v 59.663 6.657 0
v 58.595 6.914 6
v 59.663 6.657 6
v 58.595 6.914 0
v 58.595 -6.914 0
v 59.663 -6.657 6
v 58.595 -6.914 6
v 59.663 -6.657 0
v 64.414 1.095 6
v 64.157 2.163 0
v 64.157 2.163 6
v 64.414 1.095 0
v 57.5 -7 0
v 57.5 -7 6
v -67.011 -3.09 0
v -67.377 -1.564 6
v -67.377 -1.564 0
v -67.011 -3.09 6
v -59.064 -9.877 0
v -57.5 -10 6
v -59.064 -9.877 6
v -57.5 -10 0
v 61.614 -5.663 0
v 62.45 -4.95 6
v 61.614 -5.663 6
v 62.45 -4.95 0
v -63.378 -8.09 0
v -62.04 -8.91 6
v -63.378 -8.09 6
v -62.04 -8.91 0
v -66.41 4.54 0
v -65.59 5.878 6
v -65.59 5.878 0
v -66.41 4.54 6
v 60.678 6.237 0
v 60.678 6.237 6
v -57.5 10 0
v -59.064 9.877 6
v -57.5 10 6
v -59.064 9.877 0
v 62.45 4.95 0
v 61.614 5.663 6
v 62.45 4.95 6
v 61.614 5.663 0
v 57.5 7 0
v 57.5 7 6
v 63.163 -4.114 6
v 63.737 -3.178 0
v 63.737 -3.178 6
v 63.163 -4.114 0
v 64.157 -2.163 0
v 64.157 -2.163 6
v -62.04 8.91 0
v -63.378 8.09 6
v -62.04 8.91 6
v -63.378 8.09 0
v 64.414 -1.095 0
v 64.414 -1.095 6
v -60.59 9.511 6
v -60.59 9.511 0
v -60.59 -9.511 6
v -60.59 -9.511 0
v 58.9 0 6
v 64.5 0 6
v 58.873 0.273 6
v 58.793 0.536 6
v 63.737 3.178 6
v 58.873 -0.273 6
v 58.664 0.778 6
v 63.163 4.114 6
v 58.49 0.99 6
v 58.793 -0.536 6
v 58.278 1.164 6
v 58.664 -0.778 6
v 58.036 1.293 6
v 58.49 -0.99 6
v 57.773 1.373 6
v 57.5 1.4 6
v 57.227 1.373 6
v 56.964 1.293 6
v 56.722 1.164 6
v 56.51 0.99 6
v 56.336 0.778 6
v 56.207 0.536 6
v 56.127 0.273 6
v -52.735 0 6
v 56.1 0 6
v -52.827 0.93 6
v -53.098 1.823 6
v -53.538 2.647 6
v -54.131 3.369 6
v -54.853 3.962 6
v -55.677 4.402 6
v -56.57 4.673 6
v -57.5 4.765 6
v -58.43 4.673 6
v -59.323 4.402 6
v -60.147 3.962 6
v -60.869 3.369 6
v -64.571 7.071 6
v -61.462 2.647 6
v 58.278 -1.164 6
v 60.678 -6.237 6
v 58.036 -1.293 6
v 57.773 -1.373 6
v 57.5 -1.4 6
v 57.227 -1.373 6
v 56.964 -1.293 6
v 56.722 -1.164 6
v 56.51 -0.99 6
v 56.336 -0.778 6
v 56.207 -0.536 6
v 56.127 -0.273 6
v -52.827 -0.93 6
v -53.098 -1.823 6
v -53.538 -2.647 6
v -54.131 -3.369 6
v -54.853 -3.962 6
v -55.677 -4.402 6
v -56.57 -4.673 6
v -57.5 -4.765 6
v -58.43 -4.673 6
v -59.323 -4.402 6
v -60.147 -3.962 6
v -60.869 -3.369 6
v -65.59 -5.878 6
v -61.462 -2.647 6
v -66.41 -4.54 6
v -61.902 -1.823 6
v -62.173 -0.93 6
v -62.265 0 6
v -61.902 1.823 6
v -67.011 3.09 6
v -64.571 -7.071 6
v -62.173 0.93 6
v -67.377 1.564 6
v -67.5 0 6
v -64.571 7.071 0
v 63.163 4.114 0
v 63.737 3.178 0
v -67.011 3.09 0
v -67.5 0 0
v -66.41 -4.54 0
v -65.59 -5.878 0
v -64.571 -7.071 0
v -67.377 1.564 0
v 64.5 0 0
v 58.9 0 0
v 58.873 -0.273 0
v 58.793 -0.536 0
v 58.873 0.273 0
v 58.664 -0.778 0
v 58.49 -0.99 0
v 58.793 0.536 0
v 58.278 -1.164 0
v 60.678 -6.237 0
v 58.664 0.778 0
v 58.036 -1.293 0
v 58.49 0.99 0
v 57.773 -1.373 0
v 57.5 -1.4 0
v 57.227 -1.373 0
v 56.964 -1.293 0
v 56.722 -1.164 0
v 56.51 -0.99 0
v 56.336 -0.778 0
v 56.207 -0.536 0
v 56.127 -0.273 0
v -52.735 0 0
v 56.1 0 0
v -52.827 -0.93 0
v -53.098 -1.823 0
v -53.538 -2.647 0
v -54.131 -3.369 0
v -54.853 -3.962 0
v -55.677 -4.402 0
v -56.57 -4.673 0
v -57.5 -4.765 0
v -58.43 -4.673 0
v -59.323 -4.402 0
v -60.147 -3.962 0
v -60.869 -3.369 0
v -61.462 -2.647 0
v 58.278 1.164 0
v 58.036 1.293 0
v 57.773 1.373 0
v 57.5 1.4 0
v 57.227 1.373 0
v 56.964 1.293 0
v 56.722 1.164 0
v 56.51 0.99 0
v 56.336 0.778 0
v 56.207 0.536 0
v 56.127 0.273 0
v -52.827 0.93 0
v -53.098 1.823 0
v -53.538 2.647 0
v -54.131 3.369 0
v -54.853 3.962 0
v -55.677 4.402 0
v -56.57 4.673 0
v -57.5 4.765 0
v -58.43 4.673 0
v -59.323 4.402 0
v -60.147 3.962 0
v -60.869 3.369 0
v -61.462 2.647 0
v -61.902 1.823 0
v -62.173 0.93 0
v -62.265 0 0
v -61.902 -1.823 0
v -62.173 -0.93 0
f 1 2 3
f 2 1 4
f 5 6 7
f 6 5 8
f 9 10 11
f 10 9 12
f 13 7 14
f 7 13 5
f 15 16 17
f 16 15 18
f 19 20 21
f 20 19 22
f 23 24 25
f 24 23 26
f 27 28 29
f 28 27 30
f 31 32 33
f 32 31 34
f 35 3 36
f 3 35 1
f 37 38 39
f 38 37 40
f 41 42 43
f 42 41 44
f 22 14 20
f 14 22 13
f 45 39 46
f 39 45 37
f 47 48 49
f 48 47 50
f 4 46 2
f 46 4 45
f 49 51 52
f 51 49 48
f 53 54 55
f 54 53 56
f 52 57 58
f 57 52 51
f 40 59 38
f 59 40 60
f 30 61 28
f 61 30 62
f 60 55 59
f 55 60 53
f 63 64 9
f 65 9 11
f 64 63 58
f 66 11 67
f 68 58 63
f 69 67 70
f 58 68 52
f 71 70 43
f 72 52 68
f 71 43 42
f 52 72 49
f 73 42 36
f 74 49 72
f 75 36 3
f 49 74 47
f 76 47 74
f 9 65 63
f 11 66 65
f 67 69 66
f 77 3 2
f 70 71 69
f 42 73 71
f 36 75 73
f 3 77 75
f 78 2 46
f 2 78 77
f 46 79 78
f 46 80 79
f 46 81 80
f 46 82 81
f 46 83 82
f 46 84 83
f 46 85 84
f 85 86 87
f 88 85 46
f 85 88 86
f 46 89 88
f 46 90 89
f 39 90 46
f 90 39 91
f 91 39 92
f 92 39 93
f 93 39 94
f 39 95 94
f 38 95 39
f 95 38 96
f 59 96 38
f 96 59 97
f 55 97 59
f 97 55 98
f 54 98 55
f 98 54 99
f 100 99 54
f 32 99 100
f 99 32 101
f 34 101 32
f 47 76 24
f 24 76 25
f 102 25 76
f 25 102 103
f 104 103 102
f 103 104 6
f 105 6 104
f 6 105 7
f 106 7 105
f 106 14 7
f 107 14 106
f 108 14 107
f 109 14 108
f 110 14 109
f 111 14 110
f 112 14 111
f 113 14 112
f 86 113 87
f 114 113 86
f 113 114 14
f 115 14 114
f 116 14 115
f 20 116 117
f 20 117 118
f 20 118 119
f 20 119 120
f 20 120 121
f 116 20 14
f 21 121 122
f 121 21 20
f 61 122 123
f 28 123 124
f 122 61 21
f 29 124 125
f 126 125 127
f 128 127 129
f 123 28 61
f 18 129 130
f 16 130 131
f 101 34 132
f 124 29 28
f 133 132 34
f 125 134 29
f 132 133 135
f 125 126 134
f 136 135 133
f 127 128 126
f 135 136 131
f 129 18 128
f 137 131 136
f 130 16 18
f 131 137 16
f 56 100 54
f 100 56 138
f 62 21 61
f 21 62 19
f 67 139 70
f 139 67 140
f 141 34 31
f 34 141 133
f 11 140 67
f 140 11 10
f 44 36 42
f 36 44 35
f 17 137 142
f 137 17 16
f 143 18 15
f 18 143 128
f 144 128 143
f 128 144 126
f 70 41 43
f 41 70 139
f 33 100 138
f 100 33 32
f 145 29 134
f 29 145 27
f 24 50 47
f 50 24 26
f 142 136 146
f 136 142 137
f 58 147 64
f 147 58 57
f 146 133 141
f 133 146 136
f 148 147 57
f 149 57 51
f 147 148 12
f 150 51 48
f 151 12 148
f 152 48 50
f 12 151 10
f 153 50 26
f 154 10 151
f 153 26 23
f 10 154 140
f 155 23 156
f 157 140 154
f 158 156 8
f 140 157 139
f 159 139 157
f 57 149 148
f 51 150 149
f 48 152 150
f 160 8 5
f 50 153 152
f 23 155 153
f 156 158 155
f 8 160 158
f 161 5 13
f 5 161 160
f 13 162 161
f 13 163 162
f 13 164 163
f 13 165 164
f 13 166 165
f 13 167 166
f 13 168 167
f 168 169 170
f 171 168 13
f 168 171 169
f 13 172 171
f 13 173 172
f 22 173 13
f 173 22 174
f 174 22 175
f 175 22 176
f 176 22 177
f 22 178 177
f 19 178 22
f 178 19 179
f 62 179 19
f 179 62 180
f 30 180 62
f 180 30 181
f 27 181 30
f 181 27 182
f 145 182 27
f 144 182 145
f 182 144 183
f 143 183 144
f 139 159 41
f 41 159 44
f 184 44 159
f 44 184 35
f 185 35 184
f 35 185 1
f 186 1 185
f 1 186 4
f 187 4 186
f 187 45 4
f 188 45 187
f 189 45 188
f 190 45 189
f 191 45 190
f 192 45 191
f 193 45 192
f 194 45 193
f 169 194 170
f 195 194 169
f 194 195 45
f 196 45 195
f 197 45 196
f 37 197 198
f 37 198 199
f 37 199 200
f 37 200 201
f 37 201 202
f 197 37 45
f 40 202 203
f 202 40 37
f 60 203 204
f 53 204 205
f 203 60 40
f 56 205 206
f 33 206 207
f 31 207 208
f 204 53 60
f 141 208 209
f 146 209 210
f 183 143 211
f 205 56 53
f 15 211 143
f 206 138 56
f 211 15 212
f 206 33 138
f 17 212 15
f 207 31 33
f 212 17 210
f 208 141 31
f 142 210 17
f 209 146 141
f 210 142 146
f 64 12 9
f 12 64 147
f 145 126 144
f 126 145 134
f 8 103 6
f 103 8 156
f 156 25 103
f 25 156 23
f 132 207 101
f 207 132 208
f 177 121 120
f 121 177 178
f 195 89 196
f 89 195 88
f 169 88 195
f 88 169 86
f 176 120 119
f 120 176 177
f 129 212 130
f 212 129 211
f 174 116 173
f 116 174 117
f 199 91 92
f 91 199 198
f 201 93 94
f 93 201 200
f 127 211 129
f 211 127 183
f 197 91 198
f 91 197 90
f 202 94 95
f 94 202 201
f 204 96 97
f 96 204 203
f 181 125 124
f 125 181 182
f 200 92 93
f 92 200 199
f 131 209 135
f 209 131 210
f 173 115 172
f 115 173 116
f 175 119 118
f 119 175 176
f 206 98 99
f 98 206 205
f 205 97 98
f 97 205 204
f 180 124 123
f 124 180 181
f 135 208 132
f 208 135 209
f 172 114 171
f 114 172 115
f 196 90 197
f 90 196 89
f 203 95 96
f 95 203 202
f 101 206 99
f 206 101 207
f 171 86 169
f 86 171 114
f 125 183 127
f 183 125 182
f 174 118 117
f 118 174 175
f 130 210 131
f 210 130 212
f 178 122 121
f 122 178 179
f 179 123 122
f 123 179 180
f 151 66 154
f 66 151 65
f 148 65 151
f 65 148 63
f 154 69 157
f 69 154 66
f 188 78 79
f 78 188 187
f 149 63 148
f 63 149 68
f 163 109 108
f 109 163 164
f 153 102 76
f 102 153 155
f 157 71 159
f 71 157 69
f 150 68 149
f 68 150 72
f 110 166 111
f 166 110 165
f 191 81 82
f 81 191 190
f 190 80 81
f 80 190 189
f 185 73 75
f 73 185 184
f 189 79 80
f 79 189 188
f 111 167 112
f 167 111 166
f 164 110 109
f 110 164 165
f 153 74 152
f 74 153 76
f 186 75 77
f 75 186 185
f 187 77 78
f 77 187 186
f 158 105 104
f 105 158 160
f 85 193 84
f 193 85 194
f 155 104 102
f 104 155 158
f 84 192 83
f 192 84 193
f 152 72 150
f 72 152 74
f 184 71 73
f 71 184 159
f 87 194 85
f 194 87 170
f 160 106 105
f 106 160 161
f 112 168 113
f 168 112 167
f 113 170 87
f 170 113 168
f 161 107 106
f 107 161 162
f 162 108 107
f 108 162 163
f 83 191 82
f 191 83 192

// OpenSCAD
$fn = 32;

// ----------------------------------------------------------------------
// Lever: 115 mm between the bosses, 6 mm thick, smooth outline
// ----------------------------------------------------------------------

// --- parameters (mm) ---
lever_l = 115;            // distance between the boss centres
boss_a = 20;              // first boss diameter
boss_b = 14;              // second boss diameter
bore_a = 9.53;            // first bore
bore_b = 2.8;             // second bore
lever_t = 6;              // lever thickness

lever_profile = [[-67.5, 0], [-67.377, -1.564], [-67.011, -3.09], [-66.41, -4.54], [-65.59, -5.878], [-64.571, -7.071], [-63.378, -8.09], [-62.04, -8.91], [-60.59, -9.511], [-59.064, -9.877], [-57.5, -10], [57.5, -7], [58.595, -6.914], [59.663, -6.657], [60.678, -6.237], [61.614, -5.663], [62.45, -4.95], [63.163, -4.114], [63.737, -3.178], [64.157, -2.163], [64.414, -1.095], [64.5, 0], [64.414, 1.095], [64.157, 2.163], [63.737, 3.178], [63.163, 4.114], [62.45, 4.95], [61.614, 5.663], [60.678, 6.237], [59.663, 6.657], [58.595, 6.914], [57.5, 7], [-57.5, 10], [-59.064, 9.877], [-60.59, 9.511], [-62.04, 8.91], [-63.378, 8.09], [-64.571, 7.071], [-65.59, 5.878], [-66.41, 4.54], [-67.011, 3.09], [-67.377, 1.564]];

difference() {
  linear_extrude(height = lever_t) polygon(lever_profile);
  translate([-57.5, 0, -2.5]) cylinder(h = lever_t + 5, d = bore_a);
  translate([57.5, 0, -2.5]) cylinder(h = lever_t + 5, d = bore_b);
}
